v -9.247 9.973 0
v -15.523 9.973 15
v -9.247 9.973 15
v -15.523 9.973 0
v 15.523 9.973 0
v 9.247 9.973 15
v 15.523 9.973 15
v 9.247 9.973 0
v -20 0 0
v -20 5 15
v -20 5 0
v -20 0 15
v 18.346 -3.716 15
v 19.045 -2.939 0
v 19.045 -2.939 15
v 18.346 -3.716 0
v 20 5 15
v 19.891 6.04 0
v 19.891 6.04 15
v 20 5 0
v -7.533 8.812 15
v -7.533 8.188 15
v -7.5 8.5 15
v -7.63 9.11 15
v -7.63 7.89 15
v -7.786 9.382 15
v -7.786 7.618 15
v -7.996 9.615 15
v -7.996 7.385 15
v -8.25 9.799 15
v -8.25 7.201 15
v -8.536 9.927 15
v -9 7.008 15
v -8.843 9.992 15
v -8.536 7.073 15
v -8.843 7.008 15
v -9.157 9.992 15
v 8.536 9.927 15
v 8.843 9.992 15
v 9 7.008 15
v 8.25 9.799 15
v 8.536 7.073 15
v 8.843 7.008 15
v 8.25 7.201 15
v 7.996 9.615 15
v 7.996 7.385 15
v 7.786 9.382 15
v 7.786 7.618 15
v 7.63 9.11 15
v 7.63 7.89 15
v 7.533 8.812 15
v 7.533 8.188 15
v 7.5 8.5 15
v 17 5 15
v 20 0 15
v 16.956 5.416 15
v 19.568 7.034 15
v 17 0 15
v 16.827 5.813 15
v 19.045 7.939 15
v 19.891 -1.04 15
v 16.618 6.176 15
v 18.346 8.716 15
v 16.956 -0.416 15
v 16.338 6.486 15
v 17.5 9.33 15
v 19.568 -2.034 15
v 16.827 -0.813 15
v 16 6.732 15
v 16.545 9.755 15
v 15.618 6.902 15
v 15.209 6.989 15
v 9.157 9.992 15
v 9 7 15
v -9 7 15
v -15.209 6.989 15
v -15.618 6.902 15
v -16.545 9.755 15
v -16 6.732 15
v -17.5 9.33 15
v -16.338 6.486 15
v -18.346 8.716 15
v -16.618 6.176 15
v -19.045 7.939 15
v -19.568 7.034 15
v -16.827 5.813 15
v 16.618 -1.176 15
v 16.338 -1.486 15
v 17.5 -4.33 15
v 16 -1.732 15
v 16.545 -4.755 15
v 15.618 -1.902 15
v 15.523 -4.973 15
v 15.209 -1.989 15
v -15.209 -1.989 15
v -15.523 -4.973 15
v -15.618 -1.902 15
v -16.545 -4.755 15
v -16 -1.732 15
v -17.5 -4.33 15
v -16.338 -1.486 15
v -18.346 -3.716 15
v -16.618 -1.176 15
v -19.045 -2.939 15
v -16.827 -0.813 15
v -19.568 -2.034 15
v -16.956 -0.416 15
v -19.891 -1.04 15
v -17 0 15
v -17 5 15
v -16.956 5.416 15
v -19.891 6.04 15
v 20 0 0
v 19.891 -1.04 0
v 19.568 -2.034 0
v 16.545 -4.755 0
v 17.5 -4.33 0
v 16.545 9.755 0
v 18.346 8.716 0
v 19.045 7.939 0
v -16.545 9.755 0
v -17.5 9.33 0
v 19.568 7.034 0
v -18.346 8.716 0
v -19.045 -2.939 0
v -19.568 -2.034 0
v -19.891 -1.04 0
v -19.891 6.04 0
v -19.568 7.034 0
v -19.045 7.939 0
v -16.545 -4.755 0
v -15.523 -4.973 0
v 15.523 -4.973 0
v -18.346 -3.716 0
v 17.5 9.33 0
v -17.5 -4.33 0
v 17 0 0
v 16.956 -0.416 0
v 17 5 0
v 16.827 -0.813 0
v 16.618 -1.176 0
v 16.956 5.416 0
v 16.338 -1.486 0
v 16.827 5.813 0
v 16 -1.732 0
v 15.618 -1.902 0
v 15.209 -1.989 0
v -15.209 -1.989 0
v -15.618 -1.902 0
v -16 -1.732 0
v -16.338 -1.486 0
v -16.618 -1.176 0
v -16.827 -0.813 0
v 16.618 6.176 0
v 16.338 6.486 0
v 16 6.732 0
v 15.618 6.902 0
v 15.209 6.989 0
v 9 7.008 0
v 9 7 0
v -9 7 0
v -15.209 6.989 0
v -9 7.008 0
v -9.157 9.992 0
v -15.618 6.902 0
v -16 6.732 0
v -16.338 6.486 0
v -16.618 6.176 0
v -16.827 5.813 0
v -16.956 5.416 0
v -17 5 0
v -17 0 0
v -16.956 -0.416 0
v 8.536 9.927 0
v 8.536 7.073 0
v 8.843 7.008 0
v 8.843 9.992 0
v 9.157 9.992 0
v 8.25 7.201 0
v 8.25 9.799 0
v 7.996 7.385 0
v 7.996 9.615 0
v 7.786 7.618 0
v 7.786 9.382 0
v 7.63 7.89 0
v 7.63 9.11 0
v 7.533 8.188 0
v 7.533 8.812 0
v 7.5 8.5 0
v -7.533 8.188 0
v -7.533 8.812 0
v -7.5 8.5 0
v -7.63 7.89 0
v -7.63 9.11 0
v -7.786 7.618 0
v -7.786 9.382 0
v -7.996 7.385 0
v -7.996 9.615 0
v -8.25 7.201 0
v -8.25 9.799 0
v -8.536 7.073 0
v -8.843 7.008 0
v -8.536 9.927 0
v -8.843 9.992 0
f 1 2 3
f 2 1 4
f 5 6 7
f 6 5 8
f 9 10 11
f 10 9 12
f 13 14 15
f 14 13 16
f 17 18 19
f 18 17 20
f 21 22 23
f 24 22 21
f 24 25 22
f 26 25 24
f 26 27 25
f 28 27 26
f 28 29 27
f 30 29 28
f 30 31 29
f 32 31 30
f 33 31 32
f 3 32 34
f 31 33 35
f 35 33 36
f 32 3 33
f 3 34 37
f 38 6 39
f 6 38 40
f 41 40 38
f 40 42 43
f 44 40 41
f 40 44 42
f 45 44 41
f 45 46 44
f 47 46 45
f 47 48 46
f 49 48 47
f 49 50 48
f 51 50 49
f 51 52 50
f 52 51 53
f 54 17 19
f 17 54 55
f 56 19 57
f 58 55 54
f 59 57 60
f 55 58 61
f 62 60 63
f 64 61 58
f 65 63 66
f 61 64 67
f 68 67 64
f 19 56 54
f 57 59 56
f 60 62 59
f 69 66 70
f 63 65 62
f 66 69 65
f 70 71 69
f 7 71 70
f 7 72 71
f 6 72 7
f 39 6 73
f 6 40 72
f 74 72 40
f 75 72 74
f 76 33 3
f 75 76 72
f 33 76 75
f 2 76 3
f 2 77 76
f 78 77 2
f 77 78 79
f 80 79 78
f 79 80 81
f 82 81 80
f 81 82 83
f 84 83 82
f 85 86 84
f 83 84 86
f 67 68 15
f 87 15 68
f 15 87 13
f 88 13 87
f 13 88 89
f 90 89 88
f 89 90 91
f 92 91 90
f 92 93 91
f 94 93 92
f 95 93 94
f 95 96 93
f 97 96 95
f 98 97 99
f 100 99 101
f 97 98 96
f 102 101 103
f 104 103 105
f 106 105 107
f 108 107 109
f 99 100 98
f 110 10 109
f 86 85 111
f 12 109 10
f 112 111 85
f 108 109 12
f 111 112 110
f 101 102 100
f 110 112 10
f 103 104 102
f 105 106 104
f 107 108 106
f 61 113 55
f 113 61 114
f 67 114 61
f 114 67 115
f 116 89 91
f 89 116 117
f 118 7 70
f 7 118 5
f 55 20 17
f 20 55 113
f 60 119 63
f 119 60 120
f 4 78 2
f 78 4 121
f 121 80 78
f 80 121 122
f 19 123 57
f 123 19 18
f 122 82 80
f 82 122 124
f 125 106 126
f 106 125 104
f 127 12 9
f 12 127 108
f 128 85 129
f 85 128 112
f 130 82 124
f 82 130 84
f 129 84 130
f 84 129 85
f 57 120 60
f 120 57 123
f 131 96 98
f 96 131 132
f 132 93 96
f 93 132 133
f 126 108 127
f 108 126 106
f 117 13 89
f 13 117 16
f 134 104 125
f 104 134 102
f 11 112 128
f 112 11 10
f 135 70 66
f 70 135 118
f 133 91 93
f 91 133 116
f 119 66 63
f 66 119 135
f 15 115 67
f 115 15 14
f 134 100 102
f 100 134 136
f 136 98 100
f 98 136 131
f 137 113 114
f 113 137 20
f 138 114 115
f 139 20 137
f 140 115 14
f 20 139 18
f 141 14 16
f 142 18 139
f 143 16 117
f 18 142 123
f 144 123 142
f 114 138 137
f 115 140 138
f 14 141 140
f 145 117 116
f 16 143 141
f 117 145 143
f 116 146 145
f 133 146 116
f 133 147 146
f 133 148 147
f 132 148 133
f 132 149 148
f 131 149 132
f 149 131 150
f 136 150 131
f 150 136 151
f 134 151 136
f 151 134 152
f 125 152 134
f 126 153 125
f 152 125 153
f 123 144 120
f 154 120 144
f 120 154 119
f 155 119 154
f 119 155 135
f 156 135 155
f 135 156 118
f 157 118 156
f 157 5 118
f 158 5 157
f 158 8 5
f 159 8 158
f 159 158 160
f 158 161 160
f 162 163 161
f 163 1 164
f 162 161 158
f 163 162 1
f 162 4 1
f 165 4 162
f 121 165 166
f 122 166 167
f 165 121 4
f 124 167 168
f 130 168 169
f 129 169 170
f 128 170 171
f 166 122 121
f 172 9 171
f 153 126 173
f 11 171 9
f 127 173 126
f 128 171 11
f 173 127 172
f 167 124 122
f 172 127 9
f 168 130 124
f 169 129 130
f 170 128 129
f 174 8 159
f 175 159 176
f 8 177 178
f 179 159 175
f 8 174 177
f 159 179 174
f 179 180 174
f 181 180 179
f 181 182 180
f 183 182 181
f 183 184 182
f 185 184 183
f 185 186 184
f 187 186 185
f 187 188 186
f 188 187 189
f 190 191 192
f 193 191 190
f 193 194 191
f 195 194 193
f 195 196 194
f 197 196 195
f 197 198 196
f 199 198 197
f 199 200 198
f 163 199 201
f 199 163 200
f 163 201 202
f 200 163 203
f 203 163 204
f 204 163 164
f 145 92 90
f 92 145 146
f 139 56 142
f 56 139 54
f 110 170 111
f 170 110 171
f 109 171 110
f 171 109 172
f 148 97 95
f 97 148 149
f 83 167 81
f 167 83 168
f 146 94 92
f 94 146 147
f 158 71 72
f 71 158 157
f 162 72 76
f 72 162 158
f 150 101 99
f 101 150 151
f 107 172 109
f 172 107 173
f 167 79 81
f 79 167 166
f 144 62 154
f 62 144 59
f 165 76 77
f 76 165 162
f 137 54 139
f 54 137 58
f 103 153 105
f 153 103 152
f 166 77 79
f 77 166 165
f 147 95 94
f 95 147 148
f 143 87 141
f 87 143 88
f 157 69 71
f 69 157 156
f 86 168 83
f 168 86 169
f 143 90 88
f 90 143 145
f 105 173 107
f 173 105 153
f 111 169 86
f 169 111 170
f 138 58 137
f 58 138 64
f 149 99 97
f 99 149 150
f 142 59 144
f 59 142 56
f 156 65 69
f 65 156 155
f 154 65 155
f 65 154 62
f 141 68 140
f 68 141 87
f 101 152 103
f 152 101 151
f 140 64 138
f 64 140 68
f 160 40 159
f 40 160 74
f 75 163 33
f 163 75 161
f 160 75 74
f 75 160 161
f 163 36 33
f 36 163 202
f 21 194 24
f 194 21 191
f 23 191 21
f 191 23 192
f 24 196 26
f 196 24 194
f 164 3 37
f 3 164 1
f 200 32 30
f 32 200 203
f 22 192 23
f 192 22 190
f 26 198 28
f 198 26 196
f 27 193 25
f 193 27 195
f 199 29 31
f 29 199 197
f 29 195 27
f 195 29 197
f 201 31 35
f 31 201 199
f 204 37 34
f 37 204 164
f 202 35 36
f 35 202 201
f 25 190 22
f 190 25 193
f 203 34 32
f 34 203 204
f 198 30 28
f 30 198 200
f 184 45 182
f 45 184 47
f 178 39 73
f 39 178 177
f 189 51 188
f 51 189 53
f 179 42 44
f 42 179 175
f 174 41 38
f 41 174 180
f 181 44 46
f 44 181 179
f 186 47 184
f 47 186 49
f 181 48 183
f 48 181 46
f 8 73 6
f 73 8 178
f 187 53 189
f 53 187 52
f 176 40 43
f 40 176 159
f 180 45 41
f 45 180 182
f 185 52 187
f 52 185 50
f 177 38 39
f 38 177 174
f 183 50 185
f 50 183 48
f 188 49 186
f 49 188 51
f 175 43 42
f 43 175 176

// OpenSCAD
LENGTH = 40;
WIDTH = 15;
HEIGHT = 15;
CORNER_DIA = 10;
INNER_CORNER_DIA = 4;
THICKNESS = 3;

OPENING_WIDTH = 15;

$fn = 30;

module retainer() {
  difference() {
    hull() {
      l = LENGTH - CORNER_DIA;
      h = HEIGHT - CORNER_DIA;
      
      translate([-l/2, 0, 0])
      cylinder(d = CORNER_DIA, h = WIDTH);

      translate([l/2, 0, 0])
      cylinder(d = CORNER_DIA, h = WIDTH);
      
      translate([-l/2, h, 0])
      cylinder(d = CORNER_DIA, h = WIDTH);
      
      translate([l/2, h, 0])
      cylinder(d = CORNER_DIA, h = WIDTH);
    }

    #translate([0, THICKNESS - (CORNER_DIA-INNER_CORNER_DIA)/2, 0])
    hull() {
      dia = INNER_CORNER_DIA;
      l = LENGTH - INNER_CORNER_DIA - 2 * THICKNESS;
      h = HEIGHT - INNER_CORNER_DIA - 2 * THICKNESS;
      
      translate([-l/2, 0, 0])
      cylinder(d = dia, h = WIDTH);

      translate([l/2, 0, 0])
      cylinder(d = dia, h = WIDTH);
      
      translate([-l/2, h, 0])
      cylinder(d = dia, h = WIDTH);
      
      translate([l/2, h, 0])
      cylinder(d = dia, h = WIDTH);
    }
    
    w = OPENING_WIDTH + THICKNESS;
    #translate([-w/2, HEIGHT-THICKNESS-CORNER_DIA/2, 0])
    cube(size = [w, THICKNESS, WIDTH]);
  }
  
  translate([-OPENING_WIDTH/2 - THICKNESS/2, HEIGHT-CORNER_DIA/2 - THICKNESS/2, 0])
  cylinder(d = THICKNESS, h = WIDTH);

  translate([OPENING_WIDTH/2 + THICKNESS/2, HEIGHT-CORNER_DIA/2 - THICKNESS/2, 0])
  cylinder(d = THICKNESS, h = WIDTH);
}

retainer();
